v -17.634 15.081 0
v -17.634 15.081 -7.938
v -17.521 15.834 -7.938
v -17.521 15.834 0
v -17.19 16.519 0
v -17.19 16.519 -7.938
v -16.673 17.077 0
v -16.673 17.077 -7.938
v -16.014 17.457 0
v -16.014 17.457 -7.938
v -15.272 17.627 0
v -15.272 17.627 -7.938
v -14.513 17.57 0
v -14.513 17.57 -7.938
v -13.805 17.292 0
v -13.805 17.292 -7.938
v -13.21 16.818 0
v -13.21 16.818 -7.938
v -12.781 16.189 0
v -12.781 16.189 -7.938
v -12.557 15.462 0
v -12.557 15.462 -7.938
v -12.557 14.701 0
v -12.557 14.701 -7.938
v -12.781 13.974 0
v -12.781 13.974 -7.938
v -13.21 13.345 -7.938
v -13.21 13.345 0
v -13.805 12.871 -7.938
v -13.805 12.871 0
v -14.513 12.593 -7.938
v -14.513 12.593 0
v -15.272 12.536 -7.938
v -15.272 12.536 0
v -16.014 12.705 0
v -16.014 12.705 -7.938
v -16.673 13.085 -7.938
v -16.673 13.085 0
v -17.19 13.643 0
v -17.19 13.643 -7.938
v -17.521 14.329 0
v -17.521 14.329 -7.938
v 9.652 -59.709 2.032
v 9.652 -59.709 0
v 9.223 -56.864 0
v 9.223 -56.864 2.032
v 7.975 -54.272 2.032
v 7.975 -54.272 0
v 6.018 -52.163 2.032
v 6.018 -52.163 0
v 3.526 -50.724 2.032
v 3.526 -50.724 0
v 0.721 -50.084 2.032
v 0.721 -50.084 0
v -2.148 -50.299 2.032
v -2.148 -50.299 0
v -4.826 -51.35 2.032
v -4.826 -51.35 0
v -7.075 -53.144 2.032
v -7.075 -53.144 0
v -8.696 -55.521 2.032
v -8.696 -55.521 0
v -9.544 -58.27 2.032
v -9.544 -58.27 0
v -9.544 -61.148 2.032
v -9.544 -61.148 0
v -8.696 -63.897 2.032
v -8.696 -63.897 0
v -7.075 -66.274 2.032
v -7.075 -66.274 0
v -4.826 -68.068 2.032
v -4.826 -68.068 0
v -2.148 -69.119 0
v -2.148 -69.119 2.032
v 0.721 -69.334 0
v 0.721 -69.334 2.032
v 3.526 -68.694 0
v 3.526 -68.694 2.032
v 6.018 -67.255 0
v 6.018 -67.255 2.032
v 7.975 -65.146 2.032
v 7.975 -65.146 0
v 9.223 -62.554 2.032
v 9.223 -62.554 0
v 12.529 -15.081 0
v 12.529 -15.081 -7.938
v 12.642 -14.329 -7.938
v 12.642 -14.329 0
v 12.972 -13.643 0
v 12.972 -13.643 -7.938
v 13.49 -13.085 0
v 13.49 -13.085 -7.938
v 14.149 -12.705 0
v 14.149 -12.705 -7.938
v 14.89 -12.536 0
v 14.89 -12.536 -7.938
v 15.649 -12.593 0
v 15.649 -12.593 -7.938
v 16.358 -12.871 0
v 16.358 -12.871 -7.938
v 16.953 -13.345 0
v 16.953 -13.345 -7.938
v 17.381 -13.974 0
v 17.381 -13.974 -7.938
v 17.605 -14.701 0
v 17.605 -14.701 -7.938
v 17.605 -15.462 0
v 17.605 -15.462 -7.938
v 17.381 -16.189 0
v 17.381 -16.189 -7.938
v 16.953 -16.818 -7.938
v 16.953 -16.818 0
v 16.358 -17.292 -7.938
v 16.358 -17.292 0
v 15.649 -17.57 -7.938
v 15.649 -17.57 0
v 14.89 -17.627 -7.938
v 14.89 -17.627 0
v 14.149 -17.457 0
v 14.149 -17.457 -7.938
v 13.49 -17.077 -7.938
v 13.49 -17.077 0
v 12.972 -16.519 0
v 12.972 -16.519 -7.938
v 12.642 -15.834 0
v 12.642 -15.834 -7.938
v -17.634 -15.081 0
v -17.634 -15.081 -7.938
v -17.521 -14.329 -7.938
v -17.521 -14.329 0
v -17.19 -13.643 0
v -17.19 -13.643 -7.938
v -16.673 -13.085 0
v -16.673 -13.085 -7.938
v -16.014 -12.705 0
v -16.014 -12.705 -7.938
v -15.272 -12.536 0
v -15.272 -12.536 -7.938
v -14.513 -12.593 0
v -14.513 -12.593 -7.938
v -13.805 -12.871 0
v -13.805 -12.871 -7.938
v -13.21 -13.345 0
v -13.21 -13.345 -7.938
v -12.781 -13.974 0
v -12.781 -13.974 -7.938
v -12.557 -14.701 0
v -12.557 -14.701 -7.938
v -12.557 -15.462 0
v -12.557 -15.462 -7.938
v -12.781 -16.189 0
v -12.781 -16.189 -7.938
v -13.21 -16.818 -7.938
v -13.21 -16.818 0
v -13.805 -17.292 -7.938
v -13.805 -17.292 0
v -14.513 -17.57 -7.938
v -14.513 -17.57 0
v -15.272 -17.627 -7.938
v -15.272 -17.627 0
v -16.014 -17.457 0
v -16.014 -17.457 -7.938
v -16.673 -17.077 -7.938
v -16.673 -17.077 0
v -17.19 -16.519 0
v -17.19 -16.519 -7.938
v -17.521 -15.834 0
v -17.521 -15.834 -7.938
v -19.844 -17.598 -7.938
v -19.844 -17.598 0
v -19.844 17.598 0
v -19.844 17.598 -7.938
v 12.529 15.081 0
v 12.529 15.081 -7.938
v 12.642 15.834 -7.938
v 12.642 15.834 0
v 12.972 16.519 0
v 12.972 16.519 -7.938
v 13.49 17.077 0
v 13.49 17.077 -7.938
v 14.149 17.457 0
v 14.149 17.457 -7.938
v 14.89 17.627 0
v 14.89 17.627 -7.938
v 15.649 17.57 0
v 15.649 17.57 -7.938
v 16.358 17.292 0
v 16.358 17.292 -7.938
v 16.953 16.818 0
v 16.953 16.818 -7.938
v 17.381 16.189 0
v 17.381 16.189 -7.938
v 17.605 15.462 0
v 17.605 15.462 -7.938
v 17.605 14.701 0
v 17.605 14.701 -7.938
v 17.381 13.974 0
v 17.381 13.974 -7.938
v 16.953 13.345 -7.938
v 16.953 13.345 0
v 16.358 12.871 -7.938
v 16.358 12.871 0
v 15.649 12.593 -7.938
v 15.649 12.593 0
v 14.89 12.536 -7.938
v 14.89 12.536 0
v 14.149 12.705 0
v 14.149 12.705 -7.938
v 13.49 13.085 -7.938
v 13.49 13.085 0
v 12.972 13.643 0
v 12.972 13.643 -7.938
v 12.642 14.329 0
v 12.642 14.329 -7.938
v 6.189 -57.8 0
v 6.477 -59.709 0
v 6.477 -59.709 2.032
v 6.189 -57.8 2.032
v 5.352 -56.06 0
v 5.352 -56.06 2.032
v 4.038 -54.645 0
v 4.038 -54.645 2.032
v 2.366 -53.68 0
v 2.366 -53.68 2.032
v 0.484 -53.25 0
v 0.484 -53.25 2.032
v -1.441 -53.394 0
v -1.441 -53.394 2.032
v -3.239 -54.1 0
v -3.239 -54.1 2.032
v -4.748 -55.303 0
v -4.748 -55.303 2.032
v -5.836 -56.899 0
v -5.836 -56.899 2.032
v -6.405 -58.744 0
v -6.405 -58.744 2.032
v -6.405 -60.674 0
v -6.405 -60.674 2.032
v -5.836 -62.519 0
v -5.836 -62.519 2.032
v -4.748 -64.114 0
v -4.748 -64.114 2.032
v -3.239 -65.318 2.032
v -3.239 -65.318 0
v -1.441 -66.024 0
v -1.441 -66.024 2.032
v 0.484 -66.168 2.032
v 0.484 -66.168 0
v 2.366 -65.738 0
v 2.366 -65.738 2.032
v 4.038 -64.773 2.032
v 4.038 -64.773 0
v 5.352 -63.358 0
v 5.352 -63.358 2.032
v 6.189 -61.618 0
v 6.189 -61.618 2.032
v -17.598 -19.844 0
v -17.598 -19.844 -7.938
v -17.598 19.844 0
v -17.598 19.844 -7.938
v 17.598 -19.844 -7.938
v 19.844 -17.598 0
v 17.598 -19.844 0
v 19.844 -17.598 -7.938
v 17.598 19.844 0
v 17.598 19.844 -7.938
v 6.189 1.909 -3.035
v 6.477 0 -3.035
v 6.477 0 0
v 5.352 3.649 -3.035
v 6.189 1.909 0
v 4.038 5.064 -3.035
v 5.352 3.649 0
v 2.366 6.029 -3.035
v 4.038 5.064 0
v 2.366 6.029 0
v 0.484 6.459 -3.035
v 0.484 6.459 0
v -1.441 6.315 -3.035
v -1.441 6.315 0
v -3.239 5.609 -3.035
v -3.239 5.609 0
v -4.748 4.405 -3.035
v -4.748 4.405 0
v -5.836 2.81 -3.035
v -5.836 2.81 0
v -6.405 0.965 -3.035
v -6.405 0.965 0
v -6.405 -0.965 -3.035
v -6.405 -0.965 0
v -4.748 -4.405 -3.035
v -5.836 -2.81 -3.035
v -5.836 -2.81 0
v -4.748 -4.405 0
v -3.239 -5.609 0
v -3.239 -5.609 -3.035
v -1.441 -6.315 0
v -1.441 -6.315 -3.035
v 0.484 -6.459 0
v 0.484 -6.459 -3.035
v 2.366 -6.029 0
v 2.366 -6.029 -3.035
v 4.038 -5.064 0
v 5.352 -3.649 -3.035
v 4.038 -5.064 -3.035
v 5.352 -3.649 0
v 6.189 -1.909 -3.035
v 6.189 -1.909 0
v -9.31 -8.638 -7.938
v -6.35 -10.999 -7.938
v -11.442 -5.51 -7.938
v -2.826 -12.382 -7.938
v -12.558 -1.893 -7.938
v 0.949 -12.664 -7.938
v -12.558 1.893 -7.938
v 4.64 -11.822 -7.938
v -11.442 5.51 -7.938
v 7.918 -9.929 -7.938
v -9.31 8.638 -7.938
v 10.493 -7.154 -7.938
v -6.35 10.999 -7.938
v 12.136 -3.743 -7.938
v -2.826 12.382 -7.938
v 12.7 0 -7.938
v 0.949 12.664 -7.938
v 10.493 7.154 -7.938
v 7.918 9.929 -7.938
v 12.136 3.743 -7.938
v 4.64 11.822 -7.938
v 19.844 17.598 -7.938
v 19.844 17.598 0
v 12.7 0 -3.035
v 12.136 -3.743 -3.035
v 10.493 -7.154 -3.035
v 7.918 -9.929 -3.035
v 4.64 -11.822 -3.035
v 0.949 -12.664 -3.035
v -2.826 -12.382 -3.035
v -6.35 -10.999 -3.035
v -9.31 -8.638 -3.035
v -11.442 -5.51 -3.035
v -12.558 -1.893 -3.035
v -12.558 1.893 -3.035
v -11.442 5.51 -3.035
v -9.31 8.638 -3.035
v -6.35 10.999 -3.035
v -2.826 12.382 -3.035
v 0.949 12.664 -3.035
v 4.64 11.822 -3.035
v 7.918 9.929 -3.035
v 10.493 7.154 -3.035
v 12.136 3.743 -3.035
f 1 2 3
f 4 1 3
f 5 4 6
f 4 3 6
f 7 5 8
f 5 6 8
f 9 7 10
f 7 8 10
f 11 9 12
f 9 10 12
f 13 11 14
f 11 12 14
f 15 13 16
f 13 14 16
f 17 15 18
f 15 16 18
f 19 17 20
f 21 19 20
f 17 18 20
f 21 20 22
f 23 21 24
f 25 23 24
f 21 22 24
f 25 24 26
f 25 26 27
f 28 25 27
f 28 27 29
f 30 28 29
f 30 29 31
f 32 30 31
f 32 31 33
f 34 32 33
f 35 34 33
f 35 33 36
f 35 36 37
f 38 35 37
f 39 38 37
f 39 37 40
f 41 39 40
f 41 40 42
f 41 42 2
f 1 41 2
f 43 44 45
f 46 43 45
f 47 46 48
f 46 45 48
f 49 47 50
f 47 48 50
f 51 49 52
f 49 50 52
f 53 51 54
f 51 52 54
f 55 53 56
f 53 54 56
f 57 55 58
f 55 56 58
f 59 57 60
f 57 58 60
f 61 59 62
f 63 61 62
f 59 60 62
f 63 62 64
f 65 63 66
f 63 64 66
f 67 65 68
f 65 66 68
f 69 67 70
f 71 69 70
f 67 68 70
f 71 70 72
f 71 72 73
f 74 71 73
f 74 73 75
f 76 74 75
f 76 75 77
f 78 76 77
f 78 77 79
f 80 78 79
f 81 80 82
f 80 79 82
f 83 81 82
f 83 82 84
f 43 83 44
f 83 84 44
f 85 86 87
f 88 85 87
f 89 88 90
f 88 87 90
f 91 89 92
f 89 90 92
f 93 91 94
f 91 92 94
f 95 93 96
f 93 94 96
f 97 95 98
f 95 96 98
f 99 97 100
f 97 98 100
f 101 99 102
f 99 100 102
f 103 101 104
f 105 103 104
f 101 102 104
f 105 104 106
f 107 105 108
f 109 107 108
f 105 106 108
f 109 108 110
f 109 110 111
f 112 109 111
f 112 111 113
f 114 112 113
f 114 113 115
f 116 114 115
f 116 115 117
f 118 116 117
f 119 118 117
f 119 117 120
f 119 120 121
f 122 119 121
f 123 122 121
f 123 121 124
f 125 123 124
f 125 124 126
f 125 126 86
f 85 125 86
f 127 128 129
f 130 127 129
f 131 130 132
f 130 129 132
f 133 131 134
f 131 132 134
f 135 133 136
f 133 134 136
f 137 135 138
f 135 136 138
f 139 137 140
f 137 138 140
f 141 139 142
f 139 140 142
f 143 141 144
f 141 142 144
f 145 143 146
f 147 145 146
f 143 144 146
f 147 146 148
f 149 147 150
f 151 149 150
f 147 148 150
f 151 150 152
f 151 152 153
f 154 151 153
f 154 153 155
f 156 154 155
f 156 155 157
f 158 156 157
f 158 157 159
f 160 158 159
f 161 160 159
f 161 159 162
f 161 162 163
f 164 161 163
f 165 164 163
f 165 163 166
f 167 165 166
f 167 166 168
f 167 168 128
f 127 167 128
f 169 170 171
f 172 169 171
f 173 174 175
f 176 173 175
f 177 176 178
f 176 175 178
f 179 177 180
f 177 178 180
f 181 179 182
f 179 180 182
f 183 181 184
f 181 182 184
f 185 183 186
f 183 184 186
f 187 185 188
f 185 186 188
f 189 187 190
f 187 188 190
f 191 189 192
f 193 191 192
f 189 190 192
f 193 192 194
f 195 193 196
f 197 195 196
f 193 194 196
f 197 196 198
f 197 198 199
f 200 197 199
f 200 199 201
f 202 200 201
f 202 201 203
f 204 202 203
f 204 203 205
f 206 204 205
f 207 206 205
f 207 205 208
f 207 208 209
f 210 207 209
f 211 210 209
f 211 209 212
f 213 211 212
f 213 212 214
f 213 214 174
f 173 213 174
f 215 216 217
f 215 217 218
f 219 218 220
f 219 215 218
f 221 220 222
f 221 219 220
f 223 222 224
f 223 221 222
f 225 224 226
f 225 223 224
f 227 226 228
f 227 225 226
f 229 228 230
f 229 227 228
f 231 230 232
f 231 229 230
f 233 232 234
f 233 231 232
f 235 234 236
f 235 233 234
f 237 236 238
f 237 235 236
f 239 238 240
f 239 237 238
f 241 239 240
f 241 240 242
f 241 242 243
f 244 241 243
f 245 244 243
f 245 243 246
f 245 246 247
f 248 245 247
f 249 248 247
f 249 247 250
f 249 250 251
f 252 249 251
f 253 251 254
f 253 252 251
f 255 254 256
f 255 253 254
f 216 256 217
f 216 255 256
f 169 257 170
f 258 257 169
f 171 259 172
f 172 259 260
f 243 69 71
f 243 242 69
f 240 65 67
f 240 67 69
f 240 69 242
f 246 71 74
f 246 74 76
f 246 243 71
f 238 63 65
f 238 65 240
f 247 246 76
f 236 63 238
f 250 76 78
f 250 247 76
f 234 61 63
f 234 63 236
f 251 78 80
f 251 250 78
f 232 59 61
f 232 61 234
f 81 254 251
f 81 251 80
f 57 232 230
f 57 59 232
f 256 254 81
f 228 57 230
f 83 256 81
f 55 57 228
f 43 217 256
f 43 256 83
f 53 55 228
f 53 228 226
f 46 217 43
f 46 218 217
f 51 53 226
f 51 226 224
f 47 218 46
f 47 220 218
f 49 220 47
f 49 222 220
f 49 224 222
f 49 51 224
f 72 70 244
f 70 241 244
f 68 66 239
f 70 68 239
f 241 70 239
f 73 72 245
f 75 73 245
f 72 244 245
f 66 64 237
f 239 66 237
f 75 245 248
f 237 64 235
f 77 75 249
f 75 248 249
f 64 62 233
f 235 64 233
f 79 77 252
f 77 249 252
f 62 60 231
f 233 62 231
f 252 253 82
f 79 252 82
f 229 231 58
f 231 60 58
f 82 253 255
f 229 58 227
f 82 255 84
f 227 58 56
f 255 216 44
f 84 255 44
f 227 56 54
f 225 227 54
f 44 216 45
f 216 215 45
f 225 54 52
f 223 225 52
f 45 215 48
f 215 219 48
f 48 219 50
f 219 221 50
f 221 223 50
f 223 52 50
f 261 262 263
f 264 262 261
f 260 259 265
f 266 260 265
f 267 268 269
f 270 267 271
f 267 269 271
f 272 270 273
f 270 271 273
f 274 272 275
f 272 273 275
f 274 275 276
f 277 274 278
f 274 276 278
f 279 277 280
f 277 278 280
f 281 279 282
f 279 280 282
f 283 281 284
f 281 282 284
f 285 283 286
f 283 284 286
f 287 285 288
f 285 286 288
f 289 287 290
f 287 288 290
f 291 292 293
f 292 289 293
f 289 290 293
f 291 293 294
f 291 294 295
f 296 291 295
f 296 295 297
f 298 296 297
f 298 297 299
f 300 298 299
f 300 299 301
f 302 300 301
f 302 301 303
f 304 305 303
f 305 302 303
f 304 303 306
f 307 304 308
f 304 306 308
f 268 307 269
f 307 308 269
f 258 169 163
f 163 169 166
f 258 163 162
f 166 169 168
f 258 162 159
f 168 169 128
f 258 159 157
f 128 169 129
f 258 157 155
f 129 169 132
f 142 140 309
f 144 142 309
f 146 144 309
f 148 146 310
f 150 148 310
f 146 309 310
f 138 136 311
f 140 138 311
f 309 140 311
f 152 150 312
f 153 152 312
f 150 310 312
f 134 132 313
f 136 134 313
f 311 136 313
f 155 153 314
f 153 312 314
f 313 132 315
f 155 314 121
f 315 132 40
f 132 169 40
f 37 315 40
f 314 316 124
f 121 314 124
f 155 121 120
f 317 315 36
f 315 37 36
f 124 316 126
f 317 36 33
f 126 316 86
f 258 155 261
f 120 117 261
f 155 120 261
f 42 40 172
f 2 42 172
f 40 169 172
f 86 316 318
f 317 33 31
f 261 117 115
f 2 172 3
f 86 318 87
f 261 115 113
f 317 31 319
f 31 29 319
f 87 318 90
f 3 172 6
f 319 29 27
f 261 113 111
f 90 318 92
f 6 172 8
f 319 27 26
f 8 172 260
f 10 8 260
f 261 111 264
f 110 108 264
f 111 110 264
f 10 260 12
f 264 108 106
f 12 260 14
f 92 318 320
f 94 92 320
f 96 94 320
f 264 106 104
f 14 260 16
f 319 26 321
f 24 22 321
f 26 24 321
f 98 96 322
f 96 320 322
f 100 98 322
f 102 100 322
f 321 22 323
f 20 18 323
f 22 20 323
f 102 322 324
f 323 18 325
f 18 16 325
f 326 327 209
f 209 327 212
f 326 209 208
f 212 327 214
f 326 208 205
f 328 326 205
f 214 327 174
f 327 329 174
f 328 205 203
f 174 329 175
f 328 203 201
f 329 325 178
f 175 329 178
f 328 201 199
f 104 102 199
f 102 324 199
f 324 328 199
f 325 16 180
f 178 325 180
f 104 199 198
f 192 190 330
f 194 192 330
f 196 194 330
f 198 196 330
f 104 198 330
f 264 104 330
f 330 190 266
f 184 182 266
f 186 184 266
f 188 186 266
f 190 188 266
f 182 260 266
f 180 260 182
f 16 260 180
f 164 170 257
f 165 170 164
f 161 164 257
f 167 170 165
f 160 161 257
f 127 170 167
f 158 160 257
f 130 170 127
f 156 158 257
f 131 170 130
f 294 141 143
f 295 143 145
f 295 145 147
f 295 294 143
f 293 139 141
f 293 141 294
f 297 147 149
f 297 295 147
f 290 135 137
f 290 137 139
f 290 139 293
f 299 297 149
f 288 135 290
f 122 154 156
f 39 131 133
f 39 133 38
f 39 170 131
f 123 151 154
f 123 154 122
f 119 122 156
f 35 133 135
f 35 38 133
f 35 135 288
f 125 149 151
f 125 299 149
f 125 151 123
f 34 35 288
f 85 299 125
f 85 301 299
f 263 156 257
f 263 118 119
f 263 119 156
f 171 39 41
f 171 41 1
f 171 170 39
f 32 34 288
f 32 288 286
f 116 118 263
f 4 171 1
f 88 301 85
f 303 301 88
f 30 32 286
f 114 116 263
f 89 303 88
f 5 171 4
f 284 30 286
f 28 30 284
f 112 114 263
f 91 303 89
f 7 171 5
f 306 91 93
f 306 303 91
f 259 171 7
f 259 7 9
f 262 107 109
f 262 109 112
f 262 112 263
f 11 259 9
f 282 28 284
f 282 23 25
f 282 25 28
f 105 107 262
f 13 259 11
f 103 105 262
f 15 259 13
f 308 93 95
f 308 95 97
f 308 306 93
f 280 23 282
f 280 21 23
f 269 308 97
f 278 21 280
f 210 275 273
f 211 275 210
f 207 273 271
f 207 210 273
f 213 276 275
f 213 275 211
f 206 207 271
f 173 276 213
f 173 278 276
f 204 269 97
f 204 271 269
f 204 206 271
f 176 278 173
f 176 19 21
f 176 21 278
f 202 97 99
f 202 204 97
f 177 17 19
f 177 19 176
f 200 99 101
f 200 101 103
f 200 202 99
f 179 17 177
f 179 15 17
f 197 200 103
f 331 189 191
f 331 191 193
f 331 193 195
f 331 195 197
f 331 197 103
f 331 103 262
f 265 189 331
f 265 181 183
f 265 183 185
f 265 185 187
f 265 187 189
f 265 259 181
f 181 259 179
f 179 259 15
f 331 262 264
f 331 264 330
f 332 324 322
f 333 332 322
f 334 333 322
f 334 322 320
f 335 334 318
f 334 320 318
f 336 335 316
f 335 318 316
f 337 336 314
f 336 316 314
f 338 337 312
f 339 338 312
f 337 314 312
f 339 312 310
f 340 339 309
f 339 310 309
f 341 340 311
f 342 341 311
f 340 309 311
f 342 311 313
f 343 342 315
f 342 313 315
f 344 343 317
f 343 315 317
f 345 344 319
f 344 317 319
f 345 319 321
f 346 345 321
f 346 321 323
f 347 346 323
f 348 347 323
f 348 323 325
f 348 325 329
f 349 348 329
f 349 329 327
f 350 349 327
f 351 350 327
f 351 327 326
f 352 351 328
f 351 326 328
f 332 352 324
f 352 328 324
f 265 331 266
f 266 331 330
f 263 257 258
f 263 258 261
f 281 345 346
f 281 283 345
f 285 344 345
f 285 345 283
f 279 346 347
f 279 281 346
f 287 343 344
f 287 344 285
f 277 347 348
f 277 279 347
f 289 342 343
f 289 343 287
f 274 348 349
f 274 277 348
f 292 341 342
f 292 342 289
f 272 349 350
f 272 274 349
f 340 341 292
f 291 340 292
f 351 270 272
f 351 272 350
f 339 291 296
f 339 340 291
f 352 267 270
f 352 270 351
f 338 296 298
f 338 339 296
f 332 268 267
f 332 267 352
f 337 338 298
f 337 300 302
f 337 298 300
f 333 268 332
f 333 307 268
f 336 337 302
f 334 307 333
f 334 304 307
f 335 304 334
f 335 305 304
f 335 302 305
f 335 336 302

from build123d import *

# Parameters (mm, degrees)
F0_W     = 39.6875
F0_H     = 39.6875
F0_R     = 12.7
F0_R_2   = 6.477
F1_DEPTH = 7.9375
F2_R     = 12.7
F2_R_2   = 6.477
F3_DEPTH = 4.9022
F4_D     = 5.1054
F5_SIZE  = 2.2454031117
F0_R_3   = 9.652
F6_DEPTH = 2.032


with BuildPart() as f1:
    # F0 (on Top) → F1 (new body)
    with BuildSketch(Plane.XY):
        Rectangle(F0_W, F0_H)
        Circle(F0_R, mode=Mode.SUBTRACT)
        Circle(F0_R)
        Circle(F0_R_2, mode=Mode.SUBTRACT)
    extrude(amount=-F1_DEPTH)

    # F2 (on face) → F3 (cut)
    with BuildSketch(Plane(origin=(0, 0, -7.9375), x_dir=(1, 0, 0), z_dir=(0, 0, -1))):
        Circle(F2_R)
        Circle(F2_R_2, mode=Mode.SUBTRACT)
    extrude(amount=-F3_DEPTH, mode=Mode.SUBTRACT)

    # F4 (through all)
    with Locations(Plane.XY):
        with Locations((-15.08125, -15.08125), (15.08125, -15.08125), (15.08125, 15.08125), (-15.08125, 15.08125)):
            Hole(F4_D / 2)

    # F5
    f5_edges = [f1.edges().sort_by_distance(p)[0] for p in [
        (-19.84375, -19.84375, -3.96875),
        (-19.84375, 19.84375, -3.96875),
        (19.84375, 19.84375, -3.96875),
        (19.84375, -19.84375, -3.96875),
    ]]
    chamfer(f5_edges, length=F5_SIZE)


with BuildPart() as f6:
    # F0 (on Top) → F6 (new body)
    with BuildSketch(Plane.XY):
        with Locations((0, -59.708956629)):
            Circle(F0_R_3)
        with Locations((0, -59.708956629)):
            Circle(F0_R_2, mode=Mode.SUBTRACT)
    extrude(amount=F6_DEPTH)


solid = Compound([f1.part, f6.part])
